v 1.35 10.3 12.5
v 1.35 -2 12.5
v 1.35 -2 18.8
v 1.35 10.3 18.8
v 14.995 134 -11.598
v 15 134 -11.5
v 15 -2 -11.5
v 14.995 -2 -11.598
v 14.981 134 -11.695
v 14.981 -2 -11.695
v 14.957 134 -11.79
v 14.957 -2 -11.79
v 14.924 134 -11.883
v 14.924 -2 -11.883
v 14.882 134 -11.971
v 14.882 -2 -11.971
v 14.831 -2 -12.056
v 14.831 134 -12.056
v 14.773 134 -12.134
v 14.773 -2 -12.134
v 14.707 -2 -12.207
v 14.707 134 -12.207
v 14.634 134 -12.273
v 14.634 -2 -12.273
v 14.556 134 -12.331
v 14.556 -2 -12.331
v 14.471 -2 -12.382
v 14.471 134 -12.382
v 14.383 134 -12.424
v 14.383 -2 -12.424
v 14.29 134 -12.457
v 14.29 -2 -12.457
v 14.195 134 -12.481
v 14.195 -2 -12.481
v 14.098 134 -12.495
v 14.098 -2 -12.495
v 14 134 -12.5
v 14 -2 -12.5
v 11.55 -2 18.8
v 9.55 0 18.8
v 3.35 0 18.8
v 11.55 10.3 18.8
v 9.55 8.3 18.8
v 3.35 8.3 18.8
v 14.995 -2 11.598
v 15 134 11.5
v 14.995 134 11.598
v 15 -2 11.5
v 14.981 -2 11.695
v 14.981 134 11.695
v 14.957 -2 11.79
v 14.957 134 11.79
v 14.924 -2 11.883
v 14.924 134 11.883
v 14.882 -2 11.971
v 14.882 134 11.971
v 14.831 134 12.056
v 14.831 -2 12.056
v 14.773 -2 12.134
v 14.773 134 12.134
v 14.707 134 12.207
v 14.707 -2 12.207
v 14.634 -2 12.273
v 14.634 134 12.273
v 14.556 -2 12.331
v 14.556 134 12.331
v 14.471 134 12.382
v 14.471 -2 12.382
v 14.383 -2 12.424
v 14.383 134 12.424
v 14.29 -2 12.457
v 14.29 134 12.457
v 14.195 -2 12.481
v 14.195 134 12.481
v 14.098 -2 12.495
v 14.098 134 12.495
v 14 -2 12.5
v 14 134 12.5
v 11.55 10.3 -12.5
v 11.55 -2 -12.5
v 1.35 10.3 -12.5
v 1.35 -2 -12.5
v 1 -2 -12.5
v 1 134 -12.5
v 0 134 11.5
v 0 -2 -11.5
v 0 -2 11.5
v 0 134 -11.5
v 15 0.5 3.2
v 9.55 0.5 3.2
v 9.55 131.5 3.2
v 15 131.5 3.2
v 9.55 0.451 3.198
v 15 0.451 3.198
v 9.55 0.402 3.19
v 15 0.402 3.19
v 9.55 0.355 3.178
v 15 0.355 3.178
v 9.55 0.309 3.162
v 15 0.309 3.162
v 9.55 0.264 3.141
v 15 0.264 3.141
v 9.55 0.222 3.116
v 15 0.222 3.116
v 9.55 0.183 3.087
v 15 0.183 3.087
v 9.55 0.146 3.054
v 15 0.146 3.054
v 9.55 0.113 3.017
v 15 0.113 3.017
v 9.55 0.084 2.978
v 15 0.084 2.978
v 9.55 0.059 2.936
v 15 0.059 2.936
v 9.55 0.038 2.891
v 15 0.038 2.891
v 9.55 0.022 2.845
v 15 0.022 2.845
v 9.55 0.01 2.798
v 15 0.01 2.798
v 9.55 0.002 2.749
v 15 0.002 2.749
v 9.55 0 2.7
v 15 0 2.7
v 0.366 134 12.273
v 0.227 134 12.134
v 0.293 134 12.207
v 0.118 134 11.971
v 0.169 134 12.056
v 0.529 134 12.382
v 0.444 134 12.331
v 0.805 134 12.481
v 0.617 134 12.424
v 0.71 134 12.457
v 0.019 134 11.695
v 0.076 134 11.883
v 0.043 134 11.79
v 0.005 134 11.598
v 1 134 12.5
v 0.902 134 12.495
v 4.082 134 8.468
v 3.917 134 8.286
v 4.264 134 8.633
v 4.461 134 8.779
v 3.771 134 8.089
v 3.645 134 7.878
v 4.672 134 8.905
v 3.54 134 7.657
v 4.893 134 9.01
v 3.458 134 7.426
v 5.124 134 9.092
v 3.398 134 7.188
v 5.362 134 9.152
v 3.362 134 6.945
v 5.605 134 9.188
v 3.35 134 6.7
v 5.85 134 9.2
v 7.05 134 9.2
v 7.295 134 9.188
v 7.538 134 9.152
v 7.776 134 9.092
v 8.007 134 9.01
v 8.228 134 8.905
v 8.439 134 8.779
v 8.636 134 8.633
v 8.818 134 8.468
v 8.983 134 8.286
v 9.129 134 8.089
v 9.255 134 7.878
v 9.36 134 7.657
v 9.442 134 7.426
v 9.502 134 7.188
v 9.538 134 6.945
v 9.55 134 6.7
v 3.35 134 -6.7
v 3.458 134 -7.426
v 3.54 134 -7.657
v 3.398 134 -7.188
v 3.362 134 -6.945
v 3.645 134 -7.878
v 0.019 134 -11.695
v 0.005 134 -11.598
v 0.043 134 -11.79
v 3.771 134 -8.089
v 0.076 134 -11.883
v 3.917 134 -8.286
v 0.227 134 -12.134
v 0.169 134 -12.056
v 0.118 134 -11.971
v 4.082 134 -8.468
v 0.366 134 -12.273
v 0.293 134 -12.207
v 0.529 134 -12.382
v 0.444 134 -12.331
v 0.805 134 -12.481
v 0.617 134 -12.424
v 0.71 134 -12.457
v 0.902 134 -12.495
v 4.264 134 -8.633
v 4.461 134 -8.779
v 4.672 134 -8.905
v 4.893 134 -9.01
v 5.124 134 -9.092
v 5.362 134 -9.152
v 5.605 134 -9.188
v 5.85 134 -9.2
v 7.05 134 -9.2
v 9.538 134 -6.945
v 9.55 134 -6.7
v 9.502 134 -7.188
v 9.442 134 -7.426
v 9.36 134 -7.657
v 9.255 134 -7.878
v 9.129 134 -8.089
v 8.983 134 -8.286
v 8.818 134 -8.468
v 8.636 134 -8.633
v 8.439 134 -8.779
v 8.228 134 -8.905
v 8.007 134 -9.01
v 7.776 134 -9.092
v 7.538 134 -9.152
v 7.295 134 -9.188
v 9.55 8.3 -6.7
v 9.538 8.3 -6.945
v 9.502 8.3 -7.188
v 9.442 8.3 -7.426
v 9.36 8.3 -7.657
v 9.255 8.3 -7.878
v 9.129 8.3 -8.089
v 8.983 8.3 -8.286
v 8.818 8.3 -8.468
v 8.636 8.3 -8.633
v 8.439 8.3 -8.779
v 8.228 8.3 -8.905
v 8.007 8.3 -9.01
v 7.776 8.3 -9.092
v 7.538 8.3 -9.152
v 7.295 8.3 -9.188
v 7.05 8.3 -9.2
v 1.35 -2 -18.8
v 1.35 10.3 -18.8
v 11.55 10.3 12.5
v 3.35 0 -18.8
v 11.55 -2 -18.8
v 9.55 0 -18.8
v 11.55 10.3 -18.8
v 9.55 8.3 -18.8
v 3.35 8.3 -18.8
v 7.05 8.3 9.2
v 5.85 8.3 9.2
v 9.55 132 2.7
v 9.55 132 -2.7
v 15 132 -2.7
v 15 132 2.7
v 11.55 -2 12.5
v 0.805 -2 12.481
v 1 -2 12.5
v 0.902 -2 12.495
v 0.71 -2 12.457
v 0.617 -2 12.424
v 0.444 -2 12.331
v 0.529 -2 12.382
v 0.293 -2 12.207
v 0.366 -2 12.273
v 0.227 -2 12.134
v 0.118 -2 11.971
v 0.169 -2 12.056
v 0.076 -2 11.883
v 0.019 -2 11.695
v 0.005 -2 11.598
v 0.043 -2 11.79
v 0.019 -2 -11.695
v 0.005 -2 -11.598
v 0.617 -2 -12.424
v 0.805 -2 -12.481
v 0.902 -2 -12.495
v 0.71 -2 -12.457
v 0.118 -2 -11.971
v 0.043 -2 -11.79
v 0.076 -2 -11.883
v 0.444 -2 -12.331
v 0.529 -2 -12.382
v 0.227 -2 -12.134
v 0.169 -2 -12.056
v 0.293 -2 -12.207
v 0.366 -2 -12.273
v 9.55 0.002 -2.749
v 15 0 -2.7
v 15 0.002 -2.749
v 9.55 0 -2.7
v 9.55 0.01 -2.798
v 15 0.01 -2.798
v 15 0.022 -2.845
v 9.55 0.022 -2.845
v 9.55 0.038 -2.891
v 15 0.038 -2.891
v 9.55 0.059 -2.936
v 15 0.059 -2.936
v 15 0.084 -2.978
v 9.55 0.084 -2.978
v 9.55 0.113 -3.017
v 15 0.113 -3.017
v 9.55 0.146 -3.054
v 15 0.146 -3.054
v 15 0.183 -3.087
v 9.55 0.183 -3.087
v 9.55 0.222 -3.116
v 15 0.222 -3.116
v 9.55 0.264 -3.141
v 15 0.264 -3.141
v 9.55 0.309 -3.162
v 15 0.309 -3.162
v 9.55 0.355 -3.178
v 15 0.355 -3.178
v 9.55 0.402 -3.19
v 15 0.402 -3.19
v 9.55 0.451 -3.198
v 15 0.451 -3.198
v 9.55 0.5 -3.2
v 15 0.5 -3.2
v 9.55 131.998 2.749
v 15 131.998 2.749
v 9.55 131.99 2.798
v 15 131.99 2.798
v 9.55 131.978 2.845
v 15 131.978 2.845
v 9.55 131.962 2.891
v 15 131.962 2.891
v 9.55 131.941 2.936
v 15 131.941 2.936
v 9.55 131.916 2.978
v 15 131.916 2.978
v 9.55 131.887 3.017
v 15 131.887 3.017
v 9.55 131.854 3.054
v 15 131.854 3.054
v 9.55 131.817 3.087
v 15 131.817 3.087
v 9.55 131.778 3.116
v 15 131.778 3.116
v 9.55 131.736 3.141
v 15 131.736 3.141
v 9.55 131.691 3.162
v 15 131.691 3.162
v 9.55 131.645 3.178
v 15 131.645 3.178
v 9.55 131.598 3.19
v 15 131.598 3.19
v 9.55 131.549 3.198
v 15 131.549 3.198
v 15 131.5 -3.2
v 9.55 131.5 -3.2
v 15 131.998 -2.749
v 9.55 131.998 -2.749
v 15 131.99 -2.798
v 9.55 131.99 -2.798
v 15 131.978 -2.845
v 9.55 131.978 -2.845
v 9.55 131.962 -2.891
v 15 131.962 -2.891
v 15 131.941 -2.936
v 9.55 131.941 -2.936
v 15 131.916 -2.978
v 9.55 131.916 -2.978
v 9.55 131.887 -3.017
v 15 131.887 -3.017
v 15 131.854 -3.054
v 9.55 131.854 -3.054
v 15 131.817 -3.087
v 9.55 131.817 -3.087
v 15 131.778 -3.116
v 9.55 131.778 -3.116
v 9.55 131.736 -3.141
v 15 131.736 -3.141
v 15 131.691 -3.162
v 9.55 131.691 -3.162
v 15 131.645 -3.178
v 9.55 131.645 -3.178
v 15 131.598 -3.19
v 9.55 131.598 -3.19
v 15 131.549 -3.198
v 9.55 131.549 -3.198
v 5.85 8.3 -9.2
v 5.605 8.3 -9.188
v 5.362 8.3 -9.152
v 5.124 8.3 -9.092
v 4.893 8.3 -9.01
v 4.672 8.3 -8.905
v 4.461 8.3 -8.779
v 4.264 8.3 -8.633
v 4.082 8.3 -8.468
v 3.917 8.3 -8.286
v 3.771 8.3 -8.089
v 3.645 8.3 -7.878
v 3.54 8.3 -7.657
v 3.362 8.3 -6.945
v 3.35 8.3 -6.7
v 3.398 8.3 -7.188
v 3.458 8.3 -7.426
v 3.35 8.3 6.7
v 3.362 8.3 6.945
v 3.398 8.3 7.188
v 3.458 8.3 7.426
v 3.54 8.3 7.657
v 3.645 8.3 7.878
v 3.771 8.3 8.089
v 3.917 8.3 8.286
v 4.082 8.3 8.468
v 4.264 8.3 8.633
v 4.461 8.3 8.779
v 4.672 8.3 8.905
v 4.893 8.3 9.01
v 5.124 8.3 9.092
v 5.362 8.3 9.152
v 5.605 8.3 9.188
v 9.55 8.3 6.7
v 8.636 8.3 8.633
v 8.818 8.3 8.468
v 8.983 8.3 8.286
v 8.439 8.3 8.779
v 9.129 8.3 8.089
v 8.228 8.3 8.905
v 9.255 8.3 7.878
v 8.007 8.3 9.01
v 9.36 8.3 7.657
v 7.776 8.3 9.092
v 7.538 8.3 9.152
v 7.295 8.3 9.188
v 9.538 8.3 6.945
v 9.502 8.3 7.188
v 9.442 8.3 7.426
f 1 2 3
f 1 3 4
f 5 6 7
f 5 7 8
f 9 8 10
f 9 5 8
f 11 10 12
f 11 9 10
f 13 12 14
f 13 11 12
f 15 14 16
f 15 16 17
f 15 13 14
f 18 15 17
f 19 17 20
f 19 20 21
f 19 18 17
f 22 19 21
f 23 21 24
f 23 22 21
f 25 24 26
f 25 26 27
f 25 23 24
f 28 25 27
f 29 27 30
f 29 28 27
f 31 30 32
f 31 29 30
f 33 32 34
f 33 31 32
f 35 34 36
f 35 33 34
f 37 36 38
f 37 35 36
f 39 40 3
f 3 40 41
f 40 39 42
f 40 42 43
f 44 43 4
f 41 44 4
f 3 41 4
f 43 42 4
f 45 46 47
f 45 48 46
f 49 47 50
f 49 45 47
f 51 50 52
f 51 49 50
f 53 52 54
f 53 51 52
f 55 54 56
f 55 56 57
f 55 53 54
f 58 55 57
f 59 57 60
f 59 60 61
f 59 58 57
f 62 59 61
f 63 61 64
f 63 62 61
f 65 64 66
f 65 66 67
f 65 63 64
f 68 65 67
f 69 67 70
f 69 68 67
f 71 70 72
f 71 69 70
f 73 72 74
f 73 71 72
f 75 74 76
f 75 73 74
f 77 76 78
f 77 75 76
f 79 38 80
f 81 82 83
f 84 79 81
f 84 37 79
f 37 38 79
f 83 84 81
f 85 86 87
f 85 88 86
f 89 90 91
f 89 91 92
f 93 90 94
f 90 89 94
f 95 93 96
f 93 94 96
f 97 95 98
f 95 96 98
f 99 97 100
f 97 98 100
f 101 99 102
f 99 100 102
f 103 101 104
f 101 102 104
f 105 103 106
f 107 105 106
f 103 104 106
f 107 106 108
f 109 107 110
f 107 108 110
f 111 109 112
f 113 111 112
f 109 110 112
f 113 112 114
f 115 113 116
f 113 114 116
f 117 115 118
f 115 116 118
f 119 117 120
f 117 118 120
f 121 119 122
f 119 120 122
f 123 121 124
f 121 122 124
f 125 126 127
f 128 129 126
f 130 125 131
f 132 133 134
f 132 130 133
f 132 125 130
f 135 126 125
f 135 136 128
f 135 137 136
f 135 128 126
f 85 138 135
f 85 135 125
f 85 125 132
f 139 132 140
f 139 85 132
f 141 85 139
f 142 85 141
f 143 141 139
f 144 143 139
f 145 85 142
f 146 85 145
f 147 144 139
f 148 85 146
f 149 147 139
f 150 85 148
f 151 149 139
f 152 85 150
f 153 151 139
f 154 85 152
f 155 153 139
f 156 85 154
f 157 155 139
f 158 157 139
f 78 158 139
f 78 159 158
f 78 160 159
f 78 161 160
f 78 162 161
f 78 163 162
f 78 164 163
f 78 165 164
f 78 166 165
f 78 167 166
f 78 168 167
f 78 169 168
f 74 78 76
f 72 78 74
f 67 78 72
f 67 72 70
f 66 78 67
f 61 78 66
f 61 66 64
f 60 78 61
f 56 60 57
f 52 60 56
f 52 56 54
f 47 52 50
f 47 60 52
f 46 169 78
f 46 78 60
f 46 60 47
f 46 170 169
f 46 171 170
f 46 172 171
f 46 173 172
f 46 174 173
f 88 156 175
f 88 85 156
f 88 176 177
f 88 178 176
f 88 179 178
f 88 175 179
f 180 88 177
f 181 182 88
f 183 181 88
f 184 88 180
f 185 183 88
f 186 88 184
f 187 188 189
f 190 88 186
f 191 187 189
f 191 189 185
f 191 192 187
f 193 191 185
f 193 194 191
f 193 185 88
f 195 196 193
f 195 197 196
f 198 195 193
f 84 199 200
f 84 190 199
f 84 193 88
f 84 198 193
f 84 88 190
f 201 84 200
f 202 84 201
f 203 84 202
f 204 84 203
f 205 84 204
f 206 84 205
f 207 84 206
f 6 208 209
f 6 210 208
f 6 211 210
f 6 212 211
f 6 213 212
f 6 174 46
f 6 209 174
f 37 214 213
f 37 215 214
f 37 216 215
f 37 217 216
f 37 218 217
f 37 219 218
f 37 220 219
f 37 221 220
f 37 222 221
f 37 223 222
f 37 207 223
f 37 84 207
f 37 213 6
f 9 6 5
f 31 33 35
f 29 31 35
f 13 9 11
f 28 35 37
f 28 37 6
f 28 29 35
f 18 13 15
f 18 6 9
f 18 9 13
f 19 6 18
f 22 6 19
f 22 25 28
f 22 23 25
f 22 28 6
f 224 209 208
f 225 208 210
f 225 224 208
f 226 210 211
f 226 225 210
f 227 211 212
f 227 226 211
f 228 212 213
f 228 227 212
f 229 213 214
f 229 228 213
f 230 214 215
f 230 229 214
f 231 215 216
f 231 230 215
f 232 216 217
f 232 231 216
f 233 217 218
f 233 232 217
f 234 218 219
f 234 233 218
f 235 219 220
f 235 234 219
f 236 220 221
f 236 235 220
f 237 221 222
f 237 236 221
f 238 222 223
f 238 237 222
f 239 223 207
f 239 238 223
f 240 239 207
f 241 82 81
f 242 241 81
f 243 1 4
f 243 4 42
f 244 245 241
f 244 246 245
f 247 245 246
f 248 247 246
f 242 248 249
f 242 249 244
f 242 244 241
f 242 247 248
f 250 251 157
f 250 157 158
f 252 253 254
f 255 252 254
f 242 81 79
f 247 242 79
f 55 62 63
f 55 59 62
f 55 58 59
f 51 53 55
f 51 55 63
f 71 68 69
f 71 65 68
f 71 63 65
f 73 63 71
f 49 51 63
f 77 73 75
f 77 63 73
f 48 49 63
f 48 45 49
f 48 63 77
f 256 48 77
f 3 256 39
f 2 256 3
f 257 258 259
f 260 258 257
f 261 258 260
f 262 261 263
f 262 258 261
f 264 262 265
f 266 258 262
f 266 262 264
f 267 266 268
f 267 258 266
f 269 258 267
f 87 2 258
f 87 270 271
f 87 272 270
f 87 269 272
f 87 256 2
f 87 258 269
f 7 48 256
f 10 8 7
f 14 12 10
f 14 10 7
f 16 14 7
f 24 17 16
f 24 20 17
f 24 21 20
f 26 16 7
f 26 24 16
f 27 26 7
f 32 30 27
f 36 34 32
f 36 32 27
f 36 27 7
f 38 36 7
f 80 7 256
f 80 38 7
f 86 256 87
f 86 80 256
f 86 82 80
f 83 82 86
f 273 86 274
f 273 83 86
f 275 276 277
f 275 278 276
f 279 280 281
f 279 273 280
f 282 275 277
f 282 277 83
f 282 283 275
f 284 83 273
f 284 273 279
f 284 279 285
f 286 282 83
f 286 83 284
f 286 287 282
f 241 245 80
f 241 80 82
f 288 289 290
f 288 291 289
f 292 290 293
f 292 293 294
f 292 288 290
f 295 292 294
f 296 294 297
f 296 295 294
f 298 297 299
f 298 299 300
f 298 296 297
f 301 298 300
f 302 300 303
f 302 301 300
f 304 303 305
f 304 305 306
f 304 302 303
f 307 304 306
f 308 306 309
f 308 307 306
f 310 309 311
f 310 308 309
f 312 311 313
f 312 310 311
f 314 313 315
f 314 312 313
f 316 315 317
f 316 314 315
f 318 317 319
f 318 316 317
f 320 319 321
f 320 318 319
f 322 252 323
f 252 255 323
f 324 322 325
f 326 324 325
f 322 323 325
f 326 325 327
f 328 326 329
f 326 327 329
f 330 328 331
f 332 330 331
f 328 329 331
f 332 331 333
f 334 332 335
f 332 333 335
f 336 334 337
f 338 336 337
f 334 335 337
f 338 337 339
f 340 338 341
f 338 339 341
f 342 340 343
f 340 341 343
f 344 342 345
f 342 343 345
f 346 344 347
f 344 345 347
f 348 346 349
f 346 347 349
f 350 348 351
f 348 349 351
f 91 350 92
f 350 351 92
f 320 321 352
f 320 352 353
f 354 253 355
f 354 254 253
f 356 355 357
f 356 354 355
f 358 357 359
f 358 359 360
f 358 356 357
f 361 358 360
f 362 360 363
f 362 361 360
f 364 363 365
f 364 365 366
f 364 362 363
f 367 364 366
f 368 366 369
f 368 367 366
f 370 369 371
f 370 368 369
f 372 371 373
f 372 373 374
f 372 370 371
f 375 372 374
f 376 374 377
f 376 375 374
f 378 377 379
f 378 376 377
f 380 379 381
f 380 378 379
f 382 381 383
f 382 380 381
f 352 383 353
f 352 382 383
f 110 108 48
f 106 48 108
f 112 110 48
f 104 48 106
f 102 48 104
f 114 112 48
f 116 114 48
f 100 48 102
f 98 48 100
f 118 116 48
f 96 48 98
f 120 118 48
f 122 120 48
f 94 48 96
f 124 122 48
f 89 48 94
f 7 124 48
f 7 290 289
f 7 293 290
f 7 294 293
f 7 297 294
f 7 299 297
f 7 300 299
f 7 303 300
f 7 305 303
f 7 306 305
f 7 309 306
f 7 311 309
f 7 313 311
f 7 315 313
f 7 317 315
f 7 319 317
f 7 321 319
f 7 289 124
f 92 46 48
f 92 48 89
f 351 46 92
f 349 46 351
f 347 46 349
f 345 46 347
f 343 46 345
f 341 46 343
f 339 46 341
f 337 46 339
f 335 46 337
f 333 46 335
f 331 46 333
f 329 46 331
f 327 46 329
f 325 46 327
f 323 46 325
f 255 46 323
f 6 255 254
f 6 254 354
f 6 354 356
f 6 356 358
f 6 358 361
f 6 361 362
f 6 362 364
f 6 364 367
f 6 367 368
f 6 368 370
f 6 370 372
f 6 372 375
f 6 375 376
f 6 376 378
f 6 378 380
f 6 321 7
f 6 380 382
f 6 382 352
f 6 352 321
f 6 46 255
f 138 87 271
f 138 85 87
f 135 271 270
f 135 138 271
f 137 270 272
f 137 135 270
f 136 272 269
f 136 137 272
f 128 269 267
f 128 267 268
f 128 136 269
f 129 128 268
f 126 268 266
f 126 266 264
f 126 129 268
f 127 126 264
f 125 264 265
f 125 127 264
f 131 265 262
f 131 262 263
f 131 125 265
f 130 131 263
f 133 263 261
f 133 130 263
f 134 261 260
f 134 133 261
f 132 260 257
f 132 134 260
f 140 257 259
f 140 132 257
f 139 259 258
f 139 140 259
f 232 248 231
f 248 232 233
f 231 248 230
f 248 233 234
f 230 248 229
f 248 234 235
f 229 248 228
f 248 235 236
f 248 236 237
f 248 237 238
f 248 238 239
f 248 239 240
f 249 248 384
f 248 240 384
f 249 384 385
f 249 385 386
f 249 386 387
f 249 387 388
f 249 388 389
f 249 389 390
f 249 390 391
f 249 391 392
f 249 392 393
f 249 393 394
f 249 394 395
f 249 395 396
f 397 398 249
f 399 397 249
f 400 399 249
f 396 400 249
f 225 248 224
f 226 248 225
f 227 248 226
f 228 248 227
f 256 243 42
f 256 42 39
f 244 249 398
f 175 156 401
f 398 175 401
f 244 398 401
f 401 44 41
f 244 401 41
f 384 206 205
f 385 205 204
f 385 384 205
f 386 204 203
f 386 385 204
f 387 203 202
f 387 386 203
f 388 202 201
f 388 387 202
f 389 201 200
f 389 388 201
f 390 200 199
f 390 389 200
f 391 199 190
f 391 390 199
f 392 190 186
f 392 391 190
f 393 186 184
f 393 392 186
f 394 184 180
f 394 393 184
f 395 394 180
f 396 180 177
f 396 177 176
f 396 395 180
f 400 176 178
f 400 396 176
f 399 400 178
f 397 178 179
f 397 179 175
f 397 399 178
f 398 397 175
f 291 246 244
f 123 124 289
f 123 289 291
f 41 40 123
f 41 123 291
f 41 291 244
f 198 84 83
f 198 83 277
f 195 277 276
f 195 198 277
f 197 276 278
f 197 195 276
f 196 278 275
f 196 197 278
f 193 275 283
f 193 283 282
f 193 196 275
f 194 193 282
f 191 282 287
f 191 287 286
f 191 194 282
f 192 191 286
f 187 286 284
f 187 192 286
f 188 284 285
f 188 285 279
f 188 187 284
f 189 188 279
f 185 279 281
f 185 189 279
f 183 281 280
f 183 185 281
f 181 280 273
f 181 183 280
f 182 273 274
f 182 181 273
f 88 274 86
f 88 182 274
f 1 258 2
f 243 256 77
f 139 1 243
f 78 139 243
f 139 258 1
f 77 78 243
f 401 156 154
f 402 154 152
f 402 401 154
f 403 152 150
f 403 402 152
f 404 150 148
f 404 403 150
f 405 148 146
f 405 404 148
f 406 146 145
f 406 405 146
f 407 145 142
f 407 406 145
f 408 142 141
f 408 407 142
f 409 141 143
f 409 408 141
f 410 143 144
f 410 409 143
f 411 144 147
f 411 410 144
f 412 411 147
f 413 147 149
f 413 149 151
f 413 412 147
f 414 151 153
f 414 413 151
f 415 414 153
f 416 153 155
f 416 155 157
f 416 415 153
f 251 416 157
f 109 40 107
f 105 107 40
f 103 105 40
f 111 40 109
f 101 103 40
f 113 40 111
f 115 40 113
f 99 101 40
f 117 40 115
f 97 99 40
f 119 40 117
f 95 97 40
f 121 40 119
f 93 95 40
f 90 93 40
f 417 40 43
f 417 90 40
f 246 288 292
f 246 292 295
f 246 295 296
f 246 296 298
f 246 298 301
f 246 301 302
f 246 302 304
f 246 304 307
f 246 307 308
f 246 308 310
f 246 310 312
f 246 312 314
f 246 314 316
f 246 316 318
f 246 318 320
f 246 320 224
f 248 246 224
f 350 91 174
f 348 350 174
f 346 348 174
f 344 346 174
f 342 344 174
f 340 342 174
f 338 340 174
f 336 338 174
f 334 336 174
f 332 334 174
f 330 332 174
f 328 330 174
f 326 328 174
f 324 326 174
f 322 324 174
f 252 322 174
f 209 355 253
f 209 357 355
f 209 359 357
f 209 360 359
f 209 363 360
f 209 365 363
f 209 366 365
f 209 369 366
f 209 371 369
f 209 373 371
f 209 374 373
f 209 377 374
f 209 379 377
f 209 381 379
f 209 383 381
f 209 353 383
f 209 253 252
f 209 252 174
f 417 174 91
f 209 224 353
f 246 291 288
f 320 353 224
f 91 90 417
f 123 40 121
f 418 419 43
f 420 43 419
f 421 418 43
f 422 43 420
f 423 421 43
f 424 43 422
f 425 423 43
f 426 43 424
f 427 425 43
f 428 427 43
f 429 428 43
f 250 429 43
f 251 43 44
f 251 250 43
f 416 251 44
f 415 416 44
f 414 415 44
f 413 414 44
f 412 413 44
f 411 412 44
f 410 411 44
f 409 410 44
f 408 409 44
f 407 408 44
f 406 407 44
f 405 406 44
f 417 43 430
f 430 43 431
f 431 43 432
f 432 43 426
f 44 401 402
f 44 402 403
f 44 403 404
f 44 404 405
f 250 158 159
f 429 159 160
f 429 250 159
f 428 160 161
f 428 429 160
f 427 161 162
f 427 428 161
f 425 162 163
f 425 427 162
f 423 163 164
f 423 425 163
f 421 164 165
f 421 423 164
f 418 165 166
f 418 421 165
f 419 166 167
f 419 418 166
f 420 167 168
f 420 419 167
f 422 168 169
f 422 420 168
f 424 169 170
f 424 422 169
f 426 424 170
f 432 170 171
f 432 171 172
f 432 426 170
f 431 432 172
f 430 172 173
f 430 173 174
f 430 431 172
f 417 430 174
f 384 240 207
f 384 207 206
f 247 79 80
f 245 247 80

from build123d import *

# Parameters (mm, degrees)
BOSS_EXTRUDE2_DEPTH  = 134
BOSS_EXTRUDE3_DEPTH  = 2
SKETCH18_W           = 5.45
SKETCH18_H           = 6.4
BOSS_EXTRUDE10_DEPTH = 2
FILLET1_R            = 0.5
FILLET2_R            = 0.5
SKETCH45_W           = 6.2
SKETCH45_H           = 8.3
CUT_EXTRUDE6_DEPTH   = 32.3
BOSS_EXTRUDE11_DEPTH = 6.3


with BuildPart() as part:
    # Sketch3 → Boss-Extrude2 (new body)
    with BuildSketch(Plane(origin=(0, 0, 0), x_dir=(1, 0, 0), z_dir=(0, 1, 0))):
        with BuildLine():
            Line((0, -11.5), (0, 11.5))
            ThreePointArc((0, 11.5), (0.292893219, 12.207106781), (1, 12.5))
            Line((1, 12.5), (14, 12.5))
            ThreePointArc((14, 12.5), (14.707106781, 12.207106781), (15, 11.5))
            Line((15, 11.5), (15, 3.2))
            Line((15, 3.2), (9.55, 3.2))
            Line((9.55, 3.2), (9.55, 6.7))
            ThreePointArc((9.55, 6.7), (8.817766953, 8.467766953), (7.05, 9.2))
            Line((7.05, 9.2), (5.85, 9.2))
            ThreePointArc((5.85, 9.2), (4.082233047, 8.467766953), (3.35, 6.7))
            Line((3.35, 6.7), (3.35, -6.7))
            ThreePointArc((3.35, -6.7), (4.082233047, -8.467766953), (5.85, -9.2))
            Line((5.85, -9.2), (7.05, -9.2))
            ThreePointArc((7.05, -9.2), (8.817766953, -8.467766953), (9.55, -6.7))
            Line((9.55, -6.7), (9.55, -3.2))
            Line((9.55, -3.2), (15, -3.2))
            Line((15, -3.2), (15, -11.5))
            ThreePointArc((15, -11.5), (14.707106781, -12.207106781), (14, -12.5))
            Line((14, -12.5), (1, -12.5))
            ThreePointArc((1, -12.5), (0.292893219, -12.207106781), (0, -11.5))
        make_face()
    extrude(amount=BOSS_EXTRUDE2_DEPTH)

    # Sketch6 → Boss-Extrude3 (add)
    with BuildSketch(Plane.XZ):
        with BuildLine():
            Line((1, 12.5), (3.35, 12.5))
            Line((3.35, 12.5), (3.35, 18.8))
            Line((3.35, 18.8), (9.55, 18.8))
            Line((9.55, 18.8), (9.55, 12.5))
            Line((9.55, 12.5), (14, 12.5))
            ThreePointArc((14, 12.5), (14.707106781, 12.207106781), (15, 11.5))
            Line((15, 11.5), (15, -11.5))
            ThreePointArc((15, -11.5), (14.707106781, -12.207106781), (14, -12.5))
            Line((14, -12.5), (9.55, -12.5))
            Line((9.55, -12.5), (9.55, -18.8))
            Line((9.55, -18.8), (3.35, -18.8))
            Line((3.35, -18.8), (3.35, -12.5))
            Line((3.35, -12.5), (1, -12.5))
            ThreePointArc((1, -12.5), (0.292893219, -12.207106781), (0, -11.5))
            Line((0, -11.5), (0, 11.5))
            ThreePointArc((0, 11.5), (0.292893219, 12.207106781), (1, 12.5))
        make_face()
    extrude(amount=BOSS_EXTRUDE3_DEPTH)

    # Sketch18 → Boss-Extrude10 (add)
    with BuildSketch(Plane(origin=(0, 134, 0), x_dir=(1, 0, 0), z_dir=(0, 1, 0))):
        with Locations((12.275, 0)):
            Rectangle(SKETCH18_W, SKETCH18_H)
    extrude(amount=-BOSS_EXTRUDE10_DEPTH)

    # Fillet1
    fillet1_edges = [part.edges().sort_by_distance(p)[0] for p in [
        (12.275, 132, 3.2),
    ]]
    fillet(fillet1_edges, radius=FILLET1_R)

    # Fillet2
    fillet2_edges = [part.edges().sort_by_distance(p)[0] for p in [
        (12.275, 132, -3.2),
        (12.275, 0, -3.2),
        (12.275, 0, 3.2),
    ]]
    fillet(fillet2_edges, radius=FILLET2_R)

    # Sketch45 → Cut-Extrude6 (cut, through all)
    with BuildSketch(Plane(origin=(0, 0, -12.5), x_dir=(-1, 0, 0), z_dir=(0, 0, -1))):
        with Locations((-6.45, 4.15)):
            Rectangle(SKETCH45_W, SKETCH45_H)
    extrude(amount=-CUT_EXTRUDE6_DEPTH, mode=Mode.SUBTRACT)

    # Sketch46 → Boss-Extrude11 (add)
    with BuildSketch(Plane(origin=(0, 0, -12.5), x_dir=(-1, 0, 0), z_dir=(0, 0, -1))):
        Polygon((-9.55, -2), (-9.55, 8.3), (-3.35, 8.3), (-3.35, -2), (-1.35, -2), (-1.35, 10.3), (-11.55, 10.3), (-11.55, -2), align=None)
    boss_extrude11 = extrude(amount=BOSS_EXTRUDE11_DEPTH)

    # Mirror1: Boss-Extrude11 across plane
    add(boss_extrude11.mirror(Plane(origin=(0, 0, 0), x_dir=(1, 0, 0), z_dir=(0, 0, -1))))


solid = part.part
